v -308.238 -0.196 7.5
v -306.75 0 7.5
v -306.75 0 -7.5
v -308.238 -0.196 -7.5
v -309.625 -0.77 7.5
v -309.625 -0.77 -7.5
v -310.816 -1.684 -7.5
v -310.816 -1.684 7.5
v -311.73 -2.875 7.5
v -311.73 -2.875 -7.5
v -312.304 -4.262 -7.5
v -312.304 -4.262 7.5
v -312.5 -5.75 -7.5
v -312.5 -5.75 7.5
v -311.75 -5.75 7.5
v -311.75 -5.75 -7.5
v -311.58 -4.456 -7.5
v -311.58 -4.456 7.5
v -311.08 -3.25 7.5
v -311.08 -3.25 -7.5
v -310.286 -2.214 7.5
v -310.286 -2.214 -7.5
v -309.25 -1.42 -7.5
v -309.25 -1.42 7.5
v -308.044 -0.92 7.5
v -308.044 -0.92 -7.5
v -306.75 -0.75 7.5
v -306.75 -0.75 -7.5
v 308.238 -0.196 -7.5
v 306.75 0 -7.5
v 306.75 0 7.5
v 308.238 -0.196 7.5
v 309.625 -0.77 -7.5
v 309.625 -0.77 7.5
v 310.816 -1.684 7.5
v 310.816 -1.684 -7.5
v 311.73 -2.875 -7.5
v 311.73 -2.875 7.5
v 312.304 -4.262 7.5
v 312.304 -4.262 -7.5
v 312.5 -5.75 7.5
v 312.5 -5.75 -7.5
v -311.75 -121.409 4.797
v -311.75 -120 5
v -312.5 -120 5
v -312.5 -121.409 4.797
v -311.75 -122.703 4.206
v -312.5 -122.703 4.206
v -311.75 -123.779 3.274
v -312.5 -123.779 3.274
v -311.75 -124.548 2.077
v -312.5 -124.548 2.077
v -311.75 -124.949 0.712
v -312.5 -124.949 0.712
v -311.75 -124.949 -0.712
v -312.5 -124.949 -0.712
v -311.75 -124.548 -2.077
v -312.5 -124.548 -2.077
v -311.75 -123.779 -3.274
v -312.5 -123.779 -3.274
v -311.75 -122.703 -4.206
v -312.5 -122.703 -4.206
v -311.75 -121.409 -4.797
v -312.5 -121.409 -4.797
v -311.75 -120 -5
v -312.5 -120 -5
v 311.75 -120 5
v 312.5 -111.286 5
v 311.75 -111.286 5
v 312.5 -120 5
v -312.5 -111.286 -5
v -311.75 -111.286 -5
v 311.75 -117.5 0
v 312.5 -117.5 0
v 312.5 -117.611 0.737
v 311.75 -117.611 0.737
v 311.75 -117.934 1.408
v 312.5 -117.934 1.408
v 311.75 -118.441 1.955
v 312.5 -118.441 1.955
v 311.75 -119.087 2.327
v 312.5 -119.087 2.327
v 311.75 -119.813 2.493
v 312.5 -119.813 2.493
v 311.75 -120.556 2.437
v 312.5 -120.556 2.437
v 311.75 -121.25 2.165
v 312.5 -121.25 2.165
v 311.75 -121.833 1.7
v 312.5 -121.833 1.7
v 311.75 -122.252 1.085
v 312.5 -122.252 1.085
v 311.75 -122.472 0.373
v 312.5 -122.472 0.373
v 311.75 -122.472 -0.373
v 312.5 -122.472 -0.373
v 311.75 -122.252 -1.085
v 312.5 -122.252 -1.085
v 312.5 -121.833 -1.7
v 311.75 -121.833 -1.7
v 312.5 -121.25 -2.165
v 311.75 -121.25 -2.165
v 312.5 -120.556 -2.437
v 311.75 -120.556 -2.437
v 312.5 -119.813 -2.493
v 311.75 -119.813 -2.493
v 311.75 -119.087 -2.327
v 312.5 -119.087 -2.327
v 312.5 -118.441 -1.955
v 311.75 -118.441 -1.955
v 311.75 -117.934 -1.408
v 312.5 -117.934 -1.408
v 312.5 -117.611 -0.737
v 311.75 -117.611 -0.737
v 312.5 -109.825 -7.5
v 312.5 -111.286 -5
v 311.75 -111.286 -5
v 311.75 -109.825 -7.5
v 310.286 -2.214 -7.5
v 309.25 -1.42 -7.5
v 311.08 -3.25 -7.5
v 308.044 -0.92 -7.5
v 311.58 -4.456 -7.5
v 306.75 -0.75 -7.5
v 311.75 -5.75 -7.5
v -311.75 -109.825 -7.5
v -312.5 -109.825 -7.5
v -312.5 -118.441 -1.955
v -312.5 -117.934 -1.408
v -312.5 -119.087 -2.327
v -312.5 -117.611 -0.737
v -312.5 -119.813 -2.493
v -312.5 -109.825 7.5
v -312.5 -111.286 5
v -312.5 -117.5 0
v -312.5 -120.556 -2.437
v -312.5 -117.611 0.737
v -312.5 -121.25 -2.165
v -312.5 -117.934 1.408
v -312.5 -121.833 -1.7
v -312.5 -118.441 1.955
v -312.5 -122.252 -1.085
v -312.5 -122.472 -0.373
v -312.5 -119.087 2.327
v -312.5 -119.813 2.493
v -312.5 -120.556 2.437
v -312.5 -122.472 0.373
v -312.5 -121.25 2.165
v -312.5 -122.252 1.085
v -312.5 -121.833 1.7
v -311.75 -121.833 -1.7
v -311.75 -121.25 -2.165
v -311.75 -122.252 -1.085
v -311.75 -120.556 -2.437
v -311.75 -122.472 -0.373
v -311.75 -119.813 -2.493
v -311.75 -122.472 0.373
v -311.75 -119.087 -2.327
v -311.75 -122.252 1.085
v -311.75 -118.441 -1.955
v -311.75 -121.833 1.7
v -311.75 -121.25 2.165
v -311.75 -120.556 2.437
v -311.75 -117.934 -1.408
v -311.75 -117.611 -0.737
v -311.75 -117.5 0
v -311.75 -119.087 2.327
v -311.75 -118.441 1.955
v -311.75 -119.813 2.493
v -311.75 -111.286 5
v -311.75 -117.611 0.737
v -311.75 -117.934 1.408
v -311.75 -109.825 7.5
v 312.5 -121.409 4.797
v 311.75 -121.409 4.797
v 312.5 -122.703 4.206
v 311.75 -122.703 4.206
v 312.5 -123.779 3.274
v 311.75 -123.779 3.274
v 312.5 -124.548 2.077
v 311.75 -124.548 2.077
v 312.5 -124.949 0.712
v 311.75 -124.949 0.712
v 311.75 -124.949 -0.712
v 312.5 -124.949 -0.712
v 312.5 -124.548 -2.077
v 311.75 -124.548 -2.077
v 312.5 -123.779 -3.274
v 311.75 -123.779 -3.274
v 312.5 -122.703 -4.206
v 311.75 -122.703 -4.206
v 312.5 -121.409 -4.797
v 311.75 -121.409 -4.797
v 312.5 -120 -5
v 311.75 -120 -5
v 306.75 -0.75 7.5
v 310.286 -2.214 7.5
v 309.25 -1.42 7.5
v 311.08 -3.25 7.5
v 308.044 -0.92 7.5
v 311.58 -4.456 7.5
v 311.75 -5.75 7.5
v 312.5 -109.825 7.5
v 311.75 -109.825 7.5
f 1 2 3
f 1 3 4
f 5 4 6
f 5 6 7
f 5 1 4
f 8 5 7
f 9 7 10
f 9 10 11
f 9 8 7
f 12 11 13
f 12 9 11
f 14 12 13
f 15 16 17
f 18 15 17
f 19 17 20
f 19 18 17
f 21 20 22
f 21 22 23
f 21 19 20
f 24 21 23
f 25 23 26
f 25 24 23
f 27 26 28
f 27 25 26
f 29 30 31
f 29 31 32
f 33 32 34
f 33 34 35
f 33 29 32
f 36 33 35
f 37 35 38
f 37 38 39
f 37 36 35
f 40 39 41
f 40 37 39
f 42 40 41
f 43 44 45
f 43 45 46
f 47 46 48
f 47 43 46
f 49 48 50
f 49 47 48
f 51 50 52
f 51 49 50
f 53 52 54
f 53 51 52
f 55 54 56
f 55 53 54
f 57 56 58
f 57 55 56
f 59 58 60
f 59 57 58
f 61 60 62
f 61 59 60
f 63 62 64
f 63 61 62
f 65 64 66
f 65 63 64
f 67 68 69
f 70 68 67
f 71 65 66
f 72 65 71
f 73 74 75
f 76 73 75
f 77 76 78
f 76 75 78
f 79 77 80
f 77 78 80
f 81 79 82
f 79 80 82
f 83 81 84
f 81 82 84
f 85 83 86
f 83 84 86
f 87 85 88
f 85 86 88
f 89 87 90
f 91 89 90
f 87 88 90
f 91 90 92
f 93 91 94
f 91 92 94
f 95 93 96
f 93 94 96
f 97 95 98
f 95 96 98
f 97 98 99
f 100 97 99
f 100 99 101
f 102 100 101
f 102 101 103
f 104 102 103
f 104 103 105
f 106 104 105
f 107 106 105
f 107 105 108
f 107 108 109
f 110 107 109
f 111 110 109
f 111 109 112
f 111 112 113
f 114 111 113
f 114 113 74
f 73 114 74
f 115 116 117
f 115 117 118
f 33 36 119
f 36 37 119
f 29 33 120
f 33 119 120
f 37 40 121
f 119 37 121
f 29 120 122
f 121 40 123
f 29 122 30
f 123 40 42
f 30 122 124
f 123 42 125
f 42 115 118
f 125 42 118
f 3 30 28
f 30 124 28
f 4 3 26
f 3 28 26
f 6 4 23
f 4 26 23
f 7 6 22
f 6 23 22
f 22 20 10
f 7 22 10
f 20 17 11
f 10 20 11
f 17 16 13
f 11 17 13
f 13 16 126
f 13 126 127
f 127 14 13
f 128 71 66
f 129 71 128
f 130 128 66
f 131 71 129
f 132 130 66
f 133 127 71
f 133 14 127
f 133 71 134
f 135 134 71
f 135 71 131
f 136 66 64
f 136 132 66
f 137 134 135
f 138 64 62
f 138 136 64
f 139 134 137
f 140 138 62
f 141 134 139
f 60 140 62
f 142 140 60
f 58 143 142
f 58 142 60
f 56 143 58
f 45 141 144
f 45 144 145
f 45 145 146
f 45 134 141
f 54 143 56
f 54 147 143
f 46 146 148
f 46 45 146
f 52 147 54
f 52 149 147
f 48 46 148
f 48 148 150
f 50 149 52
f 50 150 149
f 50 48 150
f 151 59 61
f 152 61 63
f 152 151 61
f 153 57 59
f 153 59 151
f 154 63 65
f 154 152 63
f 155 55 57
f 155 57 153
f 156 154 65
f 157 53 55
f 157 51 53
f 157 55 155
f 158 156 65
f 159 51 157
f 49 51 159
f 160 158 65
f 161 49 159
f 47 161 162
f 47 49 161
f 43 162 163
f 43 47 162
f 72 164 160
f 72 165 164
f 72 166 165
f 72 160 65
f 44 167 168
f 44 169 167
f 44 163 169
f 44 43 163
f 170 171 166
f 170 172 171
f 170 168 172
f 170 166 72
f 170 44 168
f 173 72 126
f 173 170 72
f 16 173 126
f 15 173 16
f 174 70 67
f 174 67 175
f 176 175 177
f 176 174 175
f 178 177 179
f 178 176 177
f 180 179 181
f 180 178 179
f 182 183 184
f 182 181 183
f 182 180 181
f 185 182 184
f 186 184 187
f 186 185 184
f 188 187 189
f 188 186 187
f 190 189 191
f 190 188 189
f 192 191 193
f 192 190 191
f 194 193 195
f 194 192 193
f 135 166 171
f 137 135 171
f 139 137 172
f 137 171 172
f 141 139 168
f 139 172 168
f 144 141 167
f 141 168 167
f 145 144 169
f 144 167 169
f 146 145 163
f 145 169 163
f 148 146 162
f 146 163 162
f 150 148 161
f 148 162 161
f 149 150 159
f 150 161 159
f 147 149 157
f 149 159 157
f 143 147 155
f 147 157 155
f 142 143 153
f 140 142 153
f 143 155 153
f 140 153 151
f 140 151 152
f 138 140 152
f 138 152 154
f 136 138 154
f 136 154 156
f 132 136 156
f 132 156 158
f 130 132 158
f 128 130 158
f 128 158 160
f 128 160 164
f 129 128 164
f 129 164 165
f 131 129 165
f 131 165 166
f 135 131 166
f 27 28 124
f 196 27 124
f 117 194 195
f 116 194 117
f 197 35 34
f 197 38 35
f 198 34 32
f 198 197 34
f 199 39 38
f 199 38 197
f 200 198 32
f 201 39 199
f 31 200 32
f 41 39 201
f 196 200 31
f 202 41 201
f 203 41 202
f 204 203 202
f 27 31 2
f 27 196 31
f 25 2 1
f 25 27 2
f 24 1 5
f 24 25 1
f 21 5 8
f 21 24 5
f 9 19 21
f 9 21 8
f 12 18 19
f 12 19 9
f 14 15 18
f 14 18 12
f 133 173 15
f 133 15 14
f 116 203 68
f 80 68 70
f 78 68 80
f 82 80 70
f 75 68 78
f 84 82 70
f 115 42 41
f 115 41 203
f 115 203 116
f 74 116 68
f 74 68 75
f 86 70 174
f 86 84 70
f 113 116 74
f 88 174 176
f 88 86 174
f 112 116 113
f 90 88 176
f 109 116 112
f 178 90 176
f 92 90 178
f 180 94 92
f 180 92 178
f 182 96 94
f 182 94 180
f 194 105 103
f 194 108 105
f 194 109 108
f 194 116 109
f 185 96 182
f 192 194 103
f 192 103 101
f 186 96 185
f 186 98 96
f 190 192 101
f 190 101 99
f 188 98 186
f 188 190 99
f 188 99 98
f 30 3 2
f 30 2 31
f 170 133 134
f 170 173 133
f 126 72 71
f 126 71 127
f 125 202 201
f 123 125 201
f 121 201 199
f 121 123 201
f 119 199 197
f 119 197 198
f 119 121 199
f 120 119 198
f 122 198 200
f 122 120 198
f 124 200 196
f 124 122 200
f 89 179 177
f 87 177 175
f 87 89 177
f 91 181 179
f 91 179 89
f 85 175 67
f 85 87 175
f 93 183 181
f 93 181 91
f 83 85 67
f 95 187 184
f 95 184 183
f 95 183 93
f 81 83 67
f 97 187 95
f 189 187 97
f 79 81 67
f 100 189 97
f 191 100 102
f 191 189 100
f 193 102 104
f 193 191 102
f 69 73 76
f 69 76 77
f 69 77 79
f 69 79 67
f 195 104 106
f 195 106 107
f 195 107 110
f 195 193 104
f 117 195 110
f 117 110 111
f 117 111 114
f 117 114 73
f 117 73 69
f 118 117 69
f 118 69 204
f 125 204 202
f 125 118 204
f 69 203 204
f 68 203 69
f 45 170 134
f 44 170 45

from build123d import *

# Parameters (mm, degrees)
SKETCH1_W                      = 623.5
SKETCH1_H                      = 15
BASE_FLANGE2_DEPTH             = 0.75
EDGE_FLANGE1_STRIP_W           = 13
EDGE_FLANGE1_STRIP_H           = 0.75
EDGE_FLANGE1_STRIP_CUT_DEPTH   = 15
EDGE_FLANGE1_STRIP_2_W         = 13
EDGE_FLANGE1_STRIP_2_H         = 0.75
EDGE_FLANGE1_STRIP_CUT_2_DEPTH = 15
EDGE_FLANGE1_DEPTH             = 15
EDGE_FLANGE1_BEND_DEPTH        = 15
SKETCH17_R                     = 2.5
CUT_EXTRUDE1_DEPTH             = 638.421563802


# Sheet-metal steps are written as plain solids
with BuildPart() as part:
    # Sketch1 → Base-Flange2 (new body)
    with BuildSketch(Plane(origin=(0, 0, 0), x_dir=(1, 0, 0), z_dir=(0, 1, 0))):
        Rectangle(SKETCH1_W, SKETCH1_H)
    extrude(amount=-BASE_FLANGE2_DEPTH)

    # Edge-Flange1 strip (across the edge) → Edge-Flange1 strip cut (cut)
    with BuildSketch(Plane(origin=(311.75, -0.75, -7.5), x_dir=(-1, 0, 0), z_dir=(0, 0, 1))):
        with Locations((-1.5, -0.375)):
            Rectangle(EDGE_FLANGE1_STRIP_W, EDGE_FLANGE1_STRIP_H)
    extrude(amount=EDGE_FLANGE1_STRIP_CUT_DEPTH, mode=Mode.SUBTRACT)

    # Edge-Flange1 strip 2 (across the edge) → Edge-Flange1 strip cut 2 (cut)
    with BuildSketch(Plane(origin=(-311.75, -0.75, 7.5), x_dir=(1, 0, 0), z_dir=(0, 0, -1))):
        with Locations((-1.5, -0.375)):
            Rectangle(EDGE_FLANGE1_STRIP_2_W, EDGE_FLANGE1_STRIP_2_H)
    extrude(amount=EDGE_FLANGE1_STRIP_CUT_2_DEPTH, mode=Mode.SUBTRACT)

    # Edge-Flange1 section (across the edge) → Edge-Flange1 (add)
    with BuildSketch(Plane(origin=(311.75, -0.75, -7.5), x_dir=(-1, 0, 0), z_dir=(0, 0, 1))):
        with BuildLine():
            Line((-0.75, 5), (-0.75, 124.25))
            Line((-0.75, 124.25), (0, 124.25))
            Line((0, 124.25), (0, 5))
            ThreePointArc((0, 5), (1.464466094, 1.464466094), (5, 0))
            Line((5, 0), (5, -0.75))
            ThreePointArc((5, -0.75), (0.934136008, 0.934136008), (-0.75, 5))
        make_face()
    extrude(amount=EDGE_FLANGE1_DEPTH)

    # Edge-Flange1 section 2 (across the edge) → Edge-Flange1 bend (add)
    with BuildSketch(Plane(origin=(-311.75, -0.75, 7.5), x_dir=(1, 0, 0), z_dir=(0, 0, -1))):
        with BuildLine():
            Line((-0.75, 5), (-0.75, 124.25))
            Line((-0.75, 124.25), (0, 124.25))
            Line((0, 124.25), (0, 5))
            ThreePointArc((0, 5), (1.464466094, 1.464466094), (5, 0))
            Line((5, 0), (5, -0.75))
            ThreePointArc((5, -0.75), (0.934136008, 0.934136008), (-0.75, 5))
        make_face()
    extrude(amount=EDGE_FLANGE1_BEND_DEPTH)

    # Sketch17 → Cut-Extrude1 (cut, through all)
    with BuildSketch(Plane(origin=(312.5, 0, 0), x_dir=(0, 0, -1), z_dir=(1, 0, 0))):
        with Locations(Location((0, -120, 0), (0, 0, 90))):
            Circle(SKETCH17_R)
        with BuildLine():
            Line((-5, -111.286267084), (-5, -120))
            ThreePointArc((-5, -120), (0, -125), (5, -120))
            Line((5, -120), (5, -111.286267084))
            Line((5, -111.286267084), (9.961082892, -108.386663731))
            Line((9.961082892, -108.386663731), (9.961082892, -134.171353008))
            Line((9.961082892, -134.171353008), (-9.961082892, -134.171353008))
            Line((-9.961082892, -134.171353008), (-9.961082892, -108.386663731))
            Line((-9.961082892, -108.386663731), (-5, -111.286267084))
        make_face()
    extrude(amount=-CUT_EXTRUDE1_DEPTH, mode=Mode.SUBTRACT)


solid = part.part
